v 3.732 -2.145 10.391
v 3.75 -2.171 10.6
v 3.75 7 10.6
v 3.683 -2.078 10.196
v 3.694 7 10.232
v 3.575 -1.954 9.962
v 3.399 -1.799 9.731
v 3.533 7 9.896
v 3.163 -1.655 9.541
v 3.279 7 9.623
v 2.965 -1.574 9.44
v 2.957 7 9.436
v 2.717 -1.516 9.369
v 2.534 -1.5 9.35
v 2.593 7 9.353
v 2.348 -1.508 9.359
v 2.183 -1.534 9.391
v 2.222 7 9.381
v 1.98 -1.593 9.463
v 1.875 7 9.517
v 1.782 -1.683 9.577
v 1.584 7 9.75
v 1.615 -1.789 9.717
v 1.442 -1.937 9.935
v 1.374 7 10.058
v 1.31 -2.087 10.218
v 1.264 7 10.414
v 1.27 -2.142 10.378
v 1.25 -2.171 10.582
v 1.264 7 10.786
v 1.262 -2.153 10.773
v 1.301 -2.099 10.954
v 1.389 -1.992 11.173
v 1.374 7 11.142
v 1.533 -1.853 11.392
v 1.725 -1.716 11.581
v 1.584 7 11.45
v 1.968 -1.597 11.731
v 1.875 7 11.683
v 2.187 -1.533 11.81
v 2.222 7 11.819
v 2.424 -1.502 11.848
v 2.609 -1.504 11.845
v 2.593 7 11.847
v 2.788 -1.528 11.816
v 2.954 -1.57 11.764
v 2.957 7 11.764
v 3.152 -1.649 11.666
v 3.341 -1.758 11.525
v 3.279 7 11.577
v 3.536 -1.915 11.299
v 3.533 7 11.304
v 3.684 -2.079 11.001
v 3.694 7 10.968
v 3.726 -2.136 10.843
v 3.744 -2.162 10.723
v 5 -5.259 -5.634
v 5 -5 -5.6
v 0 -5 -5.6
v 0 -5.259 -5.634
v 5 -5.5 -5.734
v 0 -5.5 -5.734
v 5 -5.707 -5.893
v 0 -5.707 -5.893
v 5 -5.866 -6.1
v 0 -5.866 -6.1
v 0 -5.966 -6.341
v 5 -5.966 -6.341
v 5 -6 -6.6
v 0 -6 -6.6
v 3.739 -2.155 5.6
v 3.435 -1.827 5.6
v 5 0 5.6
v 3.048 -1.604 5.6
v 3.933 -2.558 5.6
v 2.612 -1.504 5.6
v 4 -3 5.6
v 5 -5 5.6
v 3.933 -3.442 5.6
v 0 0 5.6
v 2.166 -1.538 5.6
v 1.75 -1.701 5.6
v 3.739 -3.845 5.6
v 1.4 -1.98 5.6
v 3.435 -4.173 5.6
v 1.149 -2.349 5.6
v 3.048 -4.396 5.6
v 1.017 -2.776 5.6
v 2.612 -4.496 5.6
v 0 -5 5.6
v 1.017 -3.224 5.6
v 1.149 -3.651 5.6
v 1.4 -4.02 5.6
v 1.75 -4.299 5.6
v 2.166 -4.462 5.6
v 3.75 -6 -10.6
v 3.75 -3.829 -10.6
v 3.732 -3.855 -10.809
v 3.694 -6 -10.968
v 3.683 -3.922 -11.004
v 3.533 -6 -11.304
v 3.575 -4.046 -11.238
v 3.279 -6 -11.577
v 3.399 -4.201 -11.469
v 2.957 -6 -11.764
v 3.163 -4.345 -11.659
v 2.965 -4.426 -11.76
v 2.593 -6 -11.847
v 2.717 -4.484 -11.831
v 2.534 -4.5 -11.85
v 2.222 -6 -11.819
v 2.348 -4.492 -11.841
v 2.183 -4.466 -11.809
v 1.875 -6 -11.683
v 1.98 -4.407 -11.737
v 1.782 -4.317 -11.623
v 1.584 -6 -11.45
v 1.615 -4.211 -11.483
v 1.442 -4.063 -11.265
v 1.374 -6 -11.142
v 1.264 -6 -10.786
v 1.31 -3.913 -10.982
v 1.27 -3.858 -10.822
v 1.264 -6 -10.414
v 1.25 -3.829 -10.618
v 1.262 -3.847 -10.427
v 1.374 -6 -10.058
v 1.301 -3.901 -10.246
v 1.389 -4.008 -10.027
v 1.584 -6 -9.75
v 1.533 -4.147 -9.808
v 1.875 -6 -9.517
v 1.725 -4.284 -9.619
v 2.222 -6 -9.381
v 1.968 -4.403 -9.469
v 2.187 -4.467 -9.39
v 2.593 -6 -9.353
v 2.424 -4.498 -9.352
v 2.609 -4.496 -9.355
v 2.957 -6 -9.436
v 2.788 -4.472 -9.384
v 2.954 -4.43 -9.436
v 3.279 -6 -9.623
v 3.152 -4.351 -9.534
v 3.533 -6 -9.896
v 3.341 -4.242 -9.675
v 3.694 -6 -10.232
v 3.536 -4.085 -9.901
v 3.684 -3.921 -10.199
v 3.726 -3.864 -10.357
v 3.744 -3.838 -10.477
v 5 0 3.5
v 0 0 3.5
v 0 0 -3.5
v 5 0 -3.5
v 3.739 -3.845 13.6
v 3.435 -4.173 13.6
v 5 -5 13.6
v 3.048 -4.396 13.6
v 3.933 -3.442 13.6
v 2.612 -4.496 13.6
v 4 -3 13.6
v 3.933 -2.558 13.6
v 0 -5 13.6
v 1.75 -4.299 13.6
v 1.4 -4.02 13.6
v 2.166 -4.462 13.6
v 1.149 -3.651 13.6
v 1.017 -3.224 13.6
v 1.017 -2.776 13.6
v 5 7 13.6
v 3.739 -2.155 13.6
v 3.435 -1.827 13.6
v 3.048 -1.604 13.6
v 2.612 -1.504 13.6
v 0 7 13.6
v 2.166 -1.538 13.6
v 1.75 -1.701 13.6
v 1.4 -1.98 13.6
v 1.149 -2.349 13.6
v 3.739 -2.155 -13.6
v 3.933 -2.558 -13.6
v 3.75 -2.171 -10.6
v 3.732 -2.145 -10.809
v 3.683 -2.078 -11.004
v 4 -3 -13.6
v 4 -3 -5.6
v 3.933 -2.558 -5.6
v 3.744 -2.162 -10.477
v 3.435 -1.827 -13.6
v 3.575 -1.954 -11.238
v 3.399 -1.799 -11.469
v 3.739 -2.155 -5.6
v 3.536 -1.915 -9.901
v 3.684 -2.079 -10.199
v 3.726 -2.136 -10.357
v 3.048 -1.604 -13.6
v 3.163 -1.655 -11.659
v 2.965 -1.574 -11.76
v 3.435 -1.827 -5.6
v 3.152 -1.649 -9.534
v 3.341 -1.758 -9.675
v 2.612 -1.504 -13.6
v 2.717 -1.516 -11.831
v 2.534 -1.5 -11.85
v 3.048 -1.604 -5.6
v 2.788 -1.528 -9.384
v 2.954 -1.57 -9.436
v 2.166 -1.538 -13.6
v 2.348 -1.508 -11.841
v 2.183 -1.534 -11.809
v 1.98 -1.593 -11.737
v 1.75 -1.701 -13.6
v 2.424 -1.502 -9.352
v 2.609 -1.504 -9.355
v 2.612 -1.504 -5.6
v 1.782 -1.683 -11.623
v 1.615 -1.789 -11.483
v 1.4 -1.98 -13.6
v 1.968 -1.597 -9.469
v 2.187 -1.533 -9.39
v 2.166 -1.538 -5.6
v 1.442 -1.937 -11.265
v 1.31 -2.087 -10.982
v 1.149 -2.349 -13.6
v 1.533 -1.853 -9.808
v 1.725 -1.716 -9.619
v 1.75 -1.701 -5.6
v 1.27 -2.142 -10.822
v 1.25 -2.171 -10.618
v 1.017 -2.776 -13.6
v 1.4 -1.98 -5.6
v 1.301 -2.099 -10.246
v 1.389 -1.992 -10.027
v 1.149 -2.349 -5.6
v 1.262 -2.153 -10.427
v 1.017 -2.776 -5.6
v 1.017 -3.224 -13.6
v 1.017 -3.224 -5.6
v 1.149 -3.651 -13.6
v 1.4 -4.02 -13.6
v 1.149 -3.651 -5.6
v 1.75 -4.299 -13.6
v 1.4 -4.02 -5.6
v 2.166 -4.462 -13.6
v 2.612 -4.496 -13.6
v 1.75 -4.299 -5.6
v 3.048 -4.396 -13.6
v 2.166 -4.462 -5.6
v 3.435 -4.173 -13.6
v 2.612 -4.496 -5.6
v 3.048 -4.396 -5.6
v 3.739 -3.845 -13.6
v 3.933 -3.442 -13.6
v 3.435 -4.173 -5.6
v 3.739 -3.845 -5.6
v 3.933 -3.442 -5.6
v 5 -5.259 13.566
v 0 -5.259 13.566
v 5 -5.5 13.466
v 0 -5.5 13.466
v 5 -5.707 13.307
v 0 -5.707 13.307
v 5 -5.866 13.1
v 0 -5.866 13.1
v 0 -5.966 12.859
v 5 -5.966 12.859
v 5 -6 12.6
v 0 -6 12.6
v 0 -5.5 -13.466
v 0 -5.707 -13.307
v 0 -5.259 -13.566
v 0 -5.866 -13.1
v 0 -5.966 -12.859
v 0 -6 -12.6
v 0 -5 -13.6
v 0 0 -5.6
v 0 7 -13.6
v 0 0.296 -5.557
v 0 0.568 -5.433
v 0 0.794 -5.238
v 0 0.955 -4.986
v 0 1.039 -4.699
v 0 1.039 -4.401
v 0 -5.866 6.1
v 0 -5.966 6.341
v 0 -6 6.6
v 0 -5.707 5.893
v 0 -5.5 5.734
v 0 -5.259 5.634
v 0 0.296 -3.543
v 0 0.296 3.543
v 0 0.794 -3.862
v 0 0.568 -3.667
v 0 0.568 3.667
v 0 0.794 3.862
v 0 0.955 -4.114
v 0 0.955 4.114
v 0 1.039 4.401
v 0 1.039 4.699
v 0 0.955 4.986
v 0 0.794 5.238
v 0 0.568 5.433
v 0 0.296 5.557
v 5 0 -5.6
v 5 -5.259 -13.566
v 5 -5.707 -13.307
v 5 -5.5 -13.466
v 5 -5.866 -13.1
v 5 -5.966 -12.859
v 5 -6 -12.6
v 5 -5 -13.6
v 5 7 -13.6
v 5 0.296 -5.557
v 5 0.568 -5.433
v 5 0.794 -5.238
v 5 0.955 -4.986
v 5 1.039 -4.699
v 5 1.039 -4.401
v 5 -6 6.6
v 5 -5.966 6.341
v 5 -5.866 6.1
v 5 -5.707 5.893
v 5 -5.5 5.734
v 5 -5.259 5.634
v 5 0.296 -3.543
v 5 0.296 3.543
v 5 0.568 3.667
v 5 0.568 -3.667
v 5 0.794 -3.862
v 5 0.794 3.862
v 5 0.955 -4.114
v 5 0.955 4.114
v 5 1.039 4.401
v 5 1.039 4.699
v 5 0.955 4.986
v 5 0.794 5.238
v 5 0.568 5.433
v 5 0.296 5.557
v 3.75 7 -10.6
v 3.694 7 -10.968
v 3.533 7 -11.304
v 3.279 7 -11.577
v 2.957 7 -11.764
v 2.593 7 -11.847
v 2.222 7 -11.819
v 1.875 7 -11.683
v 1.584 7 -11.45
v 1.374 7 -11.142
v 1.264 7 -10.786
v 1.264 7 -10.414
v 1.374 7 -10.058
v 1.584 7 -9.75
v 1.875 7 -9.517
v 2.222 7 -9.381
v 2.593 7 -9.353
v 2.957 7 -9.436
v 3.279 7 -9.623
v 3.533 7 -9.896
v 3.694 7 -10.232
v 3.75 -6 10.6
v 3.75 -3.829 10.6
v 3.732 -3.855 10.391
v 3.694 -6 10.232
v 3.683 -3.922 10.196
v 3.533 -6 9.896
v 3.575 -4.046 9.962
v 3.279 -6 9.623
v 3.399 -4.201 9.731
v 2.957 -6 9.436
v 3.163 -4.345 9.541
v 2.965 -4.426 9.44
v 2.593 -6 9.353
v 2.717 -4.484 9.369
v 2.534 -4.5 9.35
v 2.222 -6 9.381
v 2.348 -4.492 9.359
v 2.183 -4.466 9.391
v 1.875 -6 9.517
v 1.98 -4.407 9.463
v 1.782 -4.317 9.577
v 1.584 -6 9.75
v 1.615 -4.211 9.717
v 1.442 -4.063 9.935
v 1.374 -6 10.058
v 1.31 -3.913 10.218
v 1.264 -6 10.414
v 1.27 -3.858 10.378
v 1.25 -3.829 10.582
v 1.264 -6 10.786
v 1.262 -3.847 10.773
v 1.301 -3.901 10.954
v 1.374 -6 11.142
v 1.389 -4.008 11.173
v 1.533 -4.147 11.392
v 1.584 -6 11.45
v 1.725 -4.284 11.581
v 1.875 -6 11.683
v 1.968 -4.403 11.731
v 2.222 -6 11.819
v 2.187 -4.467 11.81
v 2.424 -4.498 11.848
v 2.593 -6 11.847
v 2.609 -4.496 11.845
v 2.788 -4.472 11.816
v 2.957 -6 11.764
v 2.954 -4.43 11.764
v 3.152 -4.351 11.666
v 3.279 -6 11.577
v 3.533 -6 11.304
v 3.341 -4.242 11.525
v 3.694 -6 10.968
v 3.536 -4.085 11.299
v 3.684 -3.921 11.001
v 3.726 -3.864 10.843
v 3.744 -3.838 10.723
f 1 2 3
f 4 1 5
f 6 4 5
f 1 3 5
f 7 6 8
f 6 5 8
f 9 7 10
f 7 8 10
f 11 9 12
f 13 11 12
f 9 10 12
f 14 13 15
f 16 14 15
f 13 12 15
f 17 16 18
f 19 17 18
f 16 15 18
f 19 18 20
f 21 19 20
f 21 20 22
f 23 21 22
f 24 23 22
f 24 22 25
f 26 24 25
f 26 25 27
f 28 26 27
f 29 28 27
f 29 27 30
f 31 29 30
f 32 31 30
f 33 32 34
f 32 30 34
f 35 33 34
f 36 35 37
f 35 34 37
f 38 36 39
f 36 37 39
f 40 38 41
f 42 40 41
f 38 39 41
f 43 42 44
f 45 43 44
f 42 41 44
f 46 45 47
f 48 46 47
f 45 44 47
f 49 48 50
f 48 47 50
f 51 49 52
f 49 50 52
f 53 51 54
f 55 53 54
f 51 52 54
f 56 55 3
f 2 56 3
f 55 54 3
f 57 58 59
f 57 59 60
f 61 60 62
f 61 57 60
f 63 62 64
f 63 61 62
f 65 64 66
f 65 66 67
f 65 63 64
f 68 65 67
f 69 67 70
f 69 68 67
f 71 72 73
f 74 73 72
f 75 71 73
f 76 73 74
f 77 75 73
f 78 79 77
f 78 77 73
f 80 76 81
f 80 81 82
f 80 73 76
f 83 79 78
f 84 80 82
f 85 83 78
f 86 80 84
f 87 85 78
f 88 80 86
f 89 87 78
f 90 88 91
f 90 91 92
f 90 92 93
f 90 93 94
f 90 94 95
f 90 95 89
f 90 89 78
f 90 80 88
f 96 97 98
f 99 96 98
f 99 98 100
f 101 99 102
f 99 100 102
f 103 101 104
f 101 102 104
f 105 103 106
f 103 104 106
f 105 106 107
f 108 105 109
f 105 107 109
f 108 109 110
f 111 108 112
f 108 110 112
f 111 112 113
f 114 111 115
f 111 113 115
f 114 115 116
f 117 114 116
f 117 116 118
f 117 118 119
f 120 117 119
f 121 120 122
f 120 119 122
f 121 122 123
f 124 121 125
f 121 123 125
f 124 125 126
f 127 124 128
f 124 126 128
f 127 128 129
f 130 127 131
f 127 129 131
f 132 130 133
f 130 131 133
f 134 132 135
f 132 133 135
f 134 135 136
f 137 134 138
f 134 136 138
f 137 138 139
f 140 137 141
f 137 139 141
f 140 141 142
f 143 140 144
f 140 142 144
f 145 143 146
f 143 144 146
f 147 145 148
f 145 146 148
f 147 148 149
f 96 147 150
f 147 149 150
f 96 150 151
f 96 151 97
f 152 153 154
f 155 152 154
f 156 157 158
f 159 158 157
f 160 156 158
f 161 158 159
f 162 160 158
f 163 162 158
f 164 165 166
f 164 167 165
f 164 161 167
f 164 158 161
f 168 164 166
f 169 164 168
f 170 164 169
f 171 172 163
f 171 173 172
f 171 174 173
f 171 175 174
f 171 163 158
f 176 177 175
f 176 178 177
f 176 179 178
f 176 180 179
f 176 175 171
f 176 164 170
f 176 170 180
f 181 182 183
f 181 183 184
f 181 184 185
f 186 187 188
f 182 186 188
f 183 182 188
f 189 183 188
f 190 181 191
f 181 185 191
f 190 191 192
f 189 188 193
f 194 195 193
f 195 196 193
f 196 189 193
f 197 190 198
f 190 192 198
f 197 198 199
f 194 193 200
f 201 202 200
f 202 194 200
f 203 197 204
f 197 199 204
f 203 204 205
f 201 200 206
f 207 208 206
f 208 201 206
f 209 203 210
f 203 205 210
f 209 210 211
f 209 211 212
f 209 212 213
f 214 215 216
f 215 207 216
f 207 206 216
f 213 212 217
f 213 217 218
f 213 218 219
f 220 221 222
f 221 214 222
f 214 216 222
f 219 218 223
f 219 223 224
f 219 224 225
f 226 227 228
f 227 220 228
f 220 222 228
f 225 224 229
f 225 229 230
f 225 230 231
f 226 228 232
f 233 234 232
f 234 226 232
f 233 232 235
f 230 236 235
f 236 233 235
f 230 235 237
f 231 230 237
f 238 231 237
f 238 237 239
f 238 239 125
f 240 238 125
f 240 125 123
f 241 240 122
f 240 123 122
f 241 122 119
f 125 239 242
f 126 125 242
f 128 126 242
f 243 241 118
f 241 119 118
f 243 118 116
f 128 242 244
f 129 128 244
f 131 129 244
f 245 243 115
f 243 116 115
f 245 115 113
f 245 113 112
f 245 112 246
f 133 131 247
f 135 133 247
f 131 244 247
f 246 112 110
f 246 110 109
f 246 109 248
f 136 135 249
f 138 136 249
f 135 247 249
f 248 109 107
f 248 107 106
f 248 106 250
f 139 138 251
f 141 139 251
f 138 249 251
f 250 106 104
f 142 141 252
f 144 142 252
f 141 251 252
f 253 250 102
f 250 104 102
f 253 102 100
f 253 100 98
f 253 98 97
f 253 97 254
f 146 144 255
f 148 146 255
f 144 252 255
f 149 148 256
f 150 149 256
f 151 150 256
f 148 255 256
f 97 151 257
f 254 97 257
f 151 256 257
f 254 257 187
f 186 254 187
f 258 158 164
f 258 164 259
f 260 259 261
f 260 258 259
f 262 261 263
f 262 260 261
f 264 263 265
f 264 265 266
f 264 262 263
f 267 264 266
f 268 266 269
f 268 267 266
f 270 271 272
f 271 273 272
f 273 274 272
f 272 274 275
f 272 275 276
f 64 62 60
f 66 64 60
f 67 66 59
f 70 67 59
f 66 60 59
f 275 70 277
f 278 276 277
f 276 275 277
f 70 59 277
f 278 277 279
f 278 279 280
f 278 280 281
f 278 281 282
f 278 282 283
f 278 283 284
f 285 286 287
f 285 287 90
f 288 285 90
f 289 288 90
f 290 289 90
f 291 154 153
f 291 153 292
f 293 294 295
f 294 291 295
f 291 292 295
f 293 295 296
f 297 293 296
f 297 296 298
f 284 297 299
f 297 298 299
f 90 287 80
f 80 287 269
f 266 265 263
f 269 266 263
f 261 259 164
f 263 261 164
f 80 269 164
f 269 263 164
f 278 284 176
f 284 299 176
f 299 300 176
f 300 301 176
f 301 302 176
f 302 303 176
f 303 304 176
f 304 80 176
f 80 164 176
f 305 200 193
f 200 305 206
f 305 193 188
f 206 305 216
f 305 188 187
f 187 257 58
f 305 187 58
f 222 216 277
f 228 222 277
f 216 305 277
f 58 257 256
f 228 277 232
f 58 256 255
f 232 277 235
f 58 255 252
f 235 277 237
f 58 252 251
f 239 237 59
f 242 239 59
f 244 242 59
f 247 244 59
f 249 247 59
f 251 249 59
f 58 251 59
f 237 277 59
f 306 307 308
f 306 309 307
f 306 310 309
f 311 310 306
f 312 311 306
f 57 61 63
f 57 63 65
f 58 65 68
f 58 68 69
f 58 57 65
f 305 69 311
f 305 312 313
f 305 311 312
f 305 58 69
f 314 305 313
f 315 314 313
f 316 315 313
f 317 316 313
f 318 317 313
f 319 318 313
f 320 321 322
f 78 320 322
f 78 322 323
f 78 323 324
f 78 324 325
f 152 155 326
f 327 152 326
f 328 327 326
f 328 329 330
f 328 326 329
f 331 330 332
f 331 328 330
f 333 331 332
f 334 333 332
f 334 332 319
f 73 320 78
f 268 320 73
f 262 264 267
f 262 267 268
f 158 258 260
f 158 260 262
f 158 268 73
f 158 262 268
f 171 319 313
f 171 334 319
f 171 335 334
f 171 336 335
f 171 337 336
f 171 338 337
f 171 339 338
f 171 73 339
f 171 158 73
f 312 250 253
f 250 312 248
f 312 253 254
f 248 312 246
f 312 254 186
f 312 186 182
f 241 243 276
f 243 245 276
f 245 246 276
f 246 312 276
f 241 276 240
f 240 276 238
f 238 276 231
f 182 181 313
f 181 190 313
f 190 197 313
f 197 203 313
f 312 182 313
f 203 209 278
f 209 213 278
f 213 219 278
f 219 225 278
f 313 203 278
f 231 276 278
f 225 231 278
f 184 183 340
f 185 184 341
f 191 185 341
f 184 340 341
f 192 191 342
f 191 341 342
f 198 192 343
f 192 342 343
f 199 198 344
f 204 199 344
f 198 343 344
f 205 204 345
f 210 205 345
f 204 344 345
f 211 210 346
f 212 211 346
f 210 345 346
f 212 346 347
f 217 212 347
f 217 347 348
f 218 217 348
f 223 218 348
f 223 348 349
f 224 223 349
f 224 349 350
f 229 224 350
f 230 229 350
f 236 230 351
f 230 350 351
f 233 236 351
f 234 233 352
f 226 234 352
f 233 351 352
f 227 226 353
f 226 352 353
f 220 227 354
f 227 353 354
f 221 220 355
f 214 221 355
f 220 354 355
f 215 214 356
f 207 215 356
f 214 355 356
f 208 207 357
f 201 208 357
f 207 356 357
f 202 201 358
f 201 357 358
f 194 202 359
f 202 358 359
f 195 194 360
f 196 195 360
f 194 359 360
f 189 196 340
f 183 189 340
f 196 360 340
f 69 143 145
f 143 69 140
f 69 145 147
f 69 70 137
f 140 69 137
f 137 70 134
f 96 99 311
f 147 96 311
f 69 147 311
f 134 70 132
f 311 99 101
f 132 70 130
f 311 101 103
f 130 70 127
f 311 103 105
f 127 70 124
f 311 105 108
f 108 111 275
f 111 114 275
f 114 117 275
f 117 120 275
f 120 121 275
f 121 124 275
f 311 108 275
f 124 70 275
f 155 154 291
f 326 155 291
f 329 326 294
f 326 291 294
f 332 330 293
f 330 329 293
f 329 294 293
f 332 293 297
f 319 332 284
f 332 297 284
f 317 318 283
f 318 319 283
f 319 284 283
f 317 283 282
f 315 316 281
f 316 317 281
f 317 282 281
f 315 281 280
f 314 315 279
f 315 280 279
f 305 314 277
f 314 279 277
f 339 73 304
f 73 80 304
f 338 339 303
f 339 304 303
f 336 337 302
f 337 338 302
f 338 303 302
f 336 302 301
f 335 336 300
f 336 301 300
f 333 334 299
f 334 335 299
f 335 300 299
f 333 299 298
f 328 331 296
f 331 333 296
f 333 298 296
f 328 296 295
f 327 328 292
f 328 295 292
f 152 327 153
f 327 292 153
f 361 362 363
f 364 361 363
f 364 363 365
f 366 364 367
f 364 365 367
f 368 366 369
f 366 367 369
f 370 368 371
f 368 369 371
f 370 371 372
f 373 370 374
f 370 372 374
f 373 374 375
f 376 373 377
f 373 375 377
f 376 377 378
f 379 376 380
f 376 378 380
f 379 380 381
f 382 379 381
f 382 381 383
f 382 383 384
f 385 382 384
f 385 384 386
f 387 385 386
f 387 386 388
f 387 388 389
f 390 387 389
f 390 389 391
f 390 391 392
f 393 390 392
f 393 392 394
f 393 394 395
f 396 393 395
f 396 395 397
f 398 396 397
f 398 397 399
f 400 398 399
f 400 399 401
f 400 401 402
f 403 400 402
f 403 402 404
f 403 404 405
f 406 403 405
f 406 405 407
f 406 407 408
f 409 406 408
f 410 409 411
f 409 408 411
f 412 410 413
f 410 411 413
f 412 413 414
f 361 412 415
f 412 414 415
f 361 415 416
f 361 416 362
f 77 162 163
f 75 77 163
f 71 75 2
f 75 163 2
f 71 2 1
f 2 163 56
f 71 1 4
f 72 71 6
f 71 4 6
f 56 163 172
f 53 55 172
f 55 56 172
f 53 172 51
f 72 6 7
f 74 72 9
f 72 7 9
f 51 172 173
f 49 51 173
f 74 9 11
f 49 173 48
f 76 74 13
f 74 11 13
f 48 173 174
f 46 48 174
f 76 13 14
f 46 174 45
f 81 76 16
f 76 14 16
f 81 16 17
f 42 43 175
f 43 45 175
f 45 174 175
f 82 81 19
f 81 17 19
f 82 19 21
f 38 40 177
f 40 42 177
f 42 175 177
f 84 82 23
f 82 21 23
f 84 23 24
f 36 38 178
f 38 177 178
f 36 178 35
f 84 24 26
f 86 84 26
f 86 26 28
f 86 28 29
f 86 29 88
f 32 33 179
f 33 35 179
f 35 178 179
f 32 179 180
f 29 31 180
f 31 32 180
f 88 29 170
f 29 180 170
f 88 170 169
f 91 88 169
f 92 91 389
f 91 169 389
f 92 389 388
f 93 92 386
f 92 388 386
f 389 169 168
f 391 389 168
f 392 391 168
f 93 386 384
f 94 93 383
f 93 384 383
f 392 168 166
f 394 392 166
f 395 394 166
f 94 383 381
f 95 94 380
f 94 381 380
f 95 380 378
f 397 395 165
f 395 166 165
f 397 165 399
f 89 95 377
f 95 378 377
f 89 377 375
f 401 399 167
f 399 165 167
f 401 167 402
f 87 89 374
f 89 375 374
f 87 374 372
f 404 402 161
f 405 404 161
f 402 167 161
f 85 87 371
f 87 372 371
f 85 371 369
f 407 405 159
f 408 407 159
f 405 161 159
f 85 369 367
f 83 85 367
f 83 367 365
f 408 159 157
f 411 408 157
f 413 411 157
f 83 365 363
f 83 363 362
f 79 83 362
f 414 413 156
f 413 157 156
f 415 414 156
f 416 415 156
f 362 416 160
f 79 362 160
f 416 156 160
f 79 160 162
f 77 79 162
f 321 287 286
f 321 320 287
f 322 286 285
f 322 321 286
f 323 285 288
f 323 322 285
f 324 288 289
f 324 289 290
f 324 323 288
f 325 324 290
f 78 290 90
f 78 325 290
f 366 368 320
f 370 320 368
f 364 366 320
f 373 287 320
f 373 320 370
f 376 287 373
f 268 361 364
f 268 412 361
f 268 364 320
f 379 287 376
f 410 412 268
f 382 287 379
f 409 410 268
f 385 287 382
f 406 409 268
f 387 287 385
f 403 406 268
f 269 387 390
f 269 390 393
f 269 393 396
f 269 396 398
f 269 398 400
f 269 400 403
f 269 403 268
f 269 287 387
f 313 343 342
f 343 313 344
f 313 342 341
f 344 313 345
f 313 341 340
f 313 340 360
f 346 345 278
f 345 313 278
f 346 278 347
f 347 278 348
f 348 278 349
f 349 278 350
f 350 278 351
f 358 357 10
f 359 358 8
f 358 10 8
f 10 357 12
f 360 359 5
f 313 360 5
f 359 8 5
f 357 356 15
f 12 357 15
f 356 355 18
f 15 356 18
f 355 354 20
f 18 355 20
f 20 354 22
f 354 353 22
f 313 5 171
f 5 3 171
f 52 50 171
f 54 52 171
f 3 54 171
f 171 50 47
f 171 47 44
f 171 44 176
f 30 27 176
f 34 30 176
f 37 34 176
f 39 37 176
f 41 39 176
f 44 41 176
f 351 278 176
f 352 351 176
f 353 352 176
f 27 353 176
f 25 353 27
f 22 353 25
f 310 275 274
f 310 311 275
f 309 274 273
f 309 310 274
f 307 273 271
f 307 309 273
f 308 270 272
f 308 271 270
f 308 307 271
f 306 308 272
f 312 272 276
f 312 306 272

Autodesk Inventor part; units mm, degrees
ref_plane "YZ Plane" through (0, 0, 0) normal (1, 0, 0) x (0, 1, 0)
ref_plane "XZ Plane" through (0, 0, 0) normal (0, 1, 0) x (-1, 0, 0)
ref_plane "XY Plane" through (0, 0, 0) normal (0, 0, 1) x (1, 0, 0)
sketch "スケッチ1" plane through (0, 0, 0) normal (1, 0, 0) x (0, 1, 0)
  line L0 (7, 5.6) -> (0, 5.6)
  line L1 (0, 5.6) -> (0, -5.6)
  line L2 (0, -5.6) -> (7, -5.6)
  line L3 (7, -5.6) -> (7, 5.6)
  line L4 (7, 5.6) -> (-6, 5.6)
  line L5 (-6, 5.6) -> (-6, 13.6)
  line L6 (-6, 13.6) -> (7, 13.6)
  line L7 (7, 13.6) -> (7, 5.6)
  line L8 (7, -5.6) -> (-6, -5.6)
  line L9 (-6, -5.6) -> (-6, -13.6)
  line L10 (-6, -13.6) -> (7, -13.6)
  line L11 (7, -13.6) -> (7, -5.6)
  arc A0 (0, 3.5) -> (0, 5.6) centre (0, 4.55) ccw
  arc A1 (0, -5.6) -> (0, -3.5) centre (0, -4.55) ccw
  point P0 (0, 0)
  point P1 (0, 0)
  point P2 (0, 5.6)
  point P3 (0, 5.6)
  dimension "d0" = 7
  dimension "d1" = 11.2
  dimension "d2" = 13
  dimension "d3" = 13
  dimension "d4" = 8
  dimension "d5" = 8
  dimension "d8" = 1.05
extrude "押し出し1" add sketch "スケッチ1" along normal blind 5 contours L3 L2 A1 L1 A0 L0 | L0 L4 L5 L6 L7 | L11 L10 L9 L8 L2
sketch "スケッチ2" plane through (0, 7, 13.6) normal (0, 1, 0) x (1, 0, 0)
  line L0 (0, 27.2) -> (0, 0) projected
  line L1 (0, 0) -> (5, 0) projected
  line L2 (5, 27.2) -> (5, 0) projected
  line L3 (0, 27.2) -> (5, 27.2) projected
  line L4 (2.5, 0) -> (2.5, 27.2) construction
  circle A0 centre (2.5, 3) radius 1.25
  circle A1 centre (2.5, 24.2) radius 1.25
  point P0 (0, 13.6)
  dimension "d9" = 2.5
  dimension "d10" = 2.5
  dimension "d11" = 3
  dimension "d12" = 3
extrude "押し出し2" cut sketch "スケッチ2" against normal up to surface (13 mm away) contours A0 | A1
sketch "スケッチ3" plane through (0, -6, 13.6) normal (0, 0, 1) x (1, 0, 0)
  circle A0 centre (2.5, 3) radius 1.5
  line L0 (0, 0) -> (5, 0) projected
  point P0 (0, 6)
  point P1 (2.5, 0)
  dimension "d15" = 3
  dimension "d16" = 3
extrude "押し出し3" cut sketch "スケッチ3" against normal up to surface (27.2 mm away)
fillet "フィレット1" radius 1 4 edges at (2.5, -6, -5.6) (2.5, -6, -13.6) (2.5, -6, 5.6) (2.5, -6, 13.6)
equation "\"d3\" = d2"
equation "\"d5\" = d4"
equation "\"d10\" = d9"
equation "\"d12\" = d11"
properties part number "ウィング土台" material "アルミニウム 2014-T4"
